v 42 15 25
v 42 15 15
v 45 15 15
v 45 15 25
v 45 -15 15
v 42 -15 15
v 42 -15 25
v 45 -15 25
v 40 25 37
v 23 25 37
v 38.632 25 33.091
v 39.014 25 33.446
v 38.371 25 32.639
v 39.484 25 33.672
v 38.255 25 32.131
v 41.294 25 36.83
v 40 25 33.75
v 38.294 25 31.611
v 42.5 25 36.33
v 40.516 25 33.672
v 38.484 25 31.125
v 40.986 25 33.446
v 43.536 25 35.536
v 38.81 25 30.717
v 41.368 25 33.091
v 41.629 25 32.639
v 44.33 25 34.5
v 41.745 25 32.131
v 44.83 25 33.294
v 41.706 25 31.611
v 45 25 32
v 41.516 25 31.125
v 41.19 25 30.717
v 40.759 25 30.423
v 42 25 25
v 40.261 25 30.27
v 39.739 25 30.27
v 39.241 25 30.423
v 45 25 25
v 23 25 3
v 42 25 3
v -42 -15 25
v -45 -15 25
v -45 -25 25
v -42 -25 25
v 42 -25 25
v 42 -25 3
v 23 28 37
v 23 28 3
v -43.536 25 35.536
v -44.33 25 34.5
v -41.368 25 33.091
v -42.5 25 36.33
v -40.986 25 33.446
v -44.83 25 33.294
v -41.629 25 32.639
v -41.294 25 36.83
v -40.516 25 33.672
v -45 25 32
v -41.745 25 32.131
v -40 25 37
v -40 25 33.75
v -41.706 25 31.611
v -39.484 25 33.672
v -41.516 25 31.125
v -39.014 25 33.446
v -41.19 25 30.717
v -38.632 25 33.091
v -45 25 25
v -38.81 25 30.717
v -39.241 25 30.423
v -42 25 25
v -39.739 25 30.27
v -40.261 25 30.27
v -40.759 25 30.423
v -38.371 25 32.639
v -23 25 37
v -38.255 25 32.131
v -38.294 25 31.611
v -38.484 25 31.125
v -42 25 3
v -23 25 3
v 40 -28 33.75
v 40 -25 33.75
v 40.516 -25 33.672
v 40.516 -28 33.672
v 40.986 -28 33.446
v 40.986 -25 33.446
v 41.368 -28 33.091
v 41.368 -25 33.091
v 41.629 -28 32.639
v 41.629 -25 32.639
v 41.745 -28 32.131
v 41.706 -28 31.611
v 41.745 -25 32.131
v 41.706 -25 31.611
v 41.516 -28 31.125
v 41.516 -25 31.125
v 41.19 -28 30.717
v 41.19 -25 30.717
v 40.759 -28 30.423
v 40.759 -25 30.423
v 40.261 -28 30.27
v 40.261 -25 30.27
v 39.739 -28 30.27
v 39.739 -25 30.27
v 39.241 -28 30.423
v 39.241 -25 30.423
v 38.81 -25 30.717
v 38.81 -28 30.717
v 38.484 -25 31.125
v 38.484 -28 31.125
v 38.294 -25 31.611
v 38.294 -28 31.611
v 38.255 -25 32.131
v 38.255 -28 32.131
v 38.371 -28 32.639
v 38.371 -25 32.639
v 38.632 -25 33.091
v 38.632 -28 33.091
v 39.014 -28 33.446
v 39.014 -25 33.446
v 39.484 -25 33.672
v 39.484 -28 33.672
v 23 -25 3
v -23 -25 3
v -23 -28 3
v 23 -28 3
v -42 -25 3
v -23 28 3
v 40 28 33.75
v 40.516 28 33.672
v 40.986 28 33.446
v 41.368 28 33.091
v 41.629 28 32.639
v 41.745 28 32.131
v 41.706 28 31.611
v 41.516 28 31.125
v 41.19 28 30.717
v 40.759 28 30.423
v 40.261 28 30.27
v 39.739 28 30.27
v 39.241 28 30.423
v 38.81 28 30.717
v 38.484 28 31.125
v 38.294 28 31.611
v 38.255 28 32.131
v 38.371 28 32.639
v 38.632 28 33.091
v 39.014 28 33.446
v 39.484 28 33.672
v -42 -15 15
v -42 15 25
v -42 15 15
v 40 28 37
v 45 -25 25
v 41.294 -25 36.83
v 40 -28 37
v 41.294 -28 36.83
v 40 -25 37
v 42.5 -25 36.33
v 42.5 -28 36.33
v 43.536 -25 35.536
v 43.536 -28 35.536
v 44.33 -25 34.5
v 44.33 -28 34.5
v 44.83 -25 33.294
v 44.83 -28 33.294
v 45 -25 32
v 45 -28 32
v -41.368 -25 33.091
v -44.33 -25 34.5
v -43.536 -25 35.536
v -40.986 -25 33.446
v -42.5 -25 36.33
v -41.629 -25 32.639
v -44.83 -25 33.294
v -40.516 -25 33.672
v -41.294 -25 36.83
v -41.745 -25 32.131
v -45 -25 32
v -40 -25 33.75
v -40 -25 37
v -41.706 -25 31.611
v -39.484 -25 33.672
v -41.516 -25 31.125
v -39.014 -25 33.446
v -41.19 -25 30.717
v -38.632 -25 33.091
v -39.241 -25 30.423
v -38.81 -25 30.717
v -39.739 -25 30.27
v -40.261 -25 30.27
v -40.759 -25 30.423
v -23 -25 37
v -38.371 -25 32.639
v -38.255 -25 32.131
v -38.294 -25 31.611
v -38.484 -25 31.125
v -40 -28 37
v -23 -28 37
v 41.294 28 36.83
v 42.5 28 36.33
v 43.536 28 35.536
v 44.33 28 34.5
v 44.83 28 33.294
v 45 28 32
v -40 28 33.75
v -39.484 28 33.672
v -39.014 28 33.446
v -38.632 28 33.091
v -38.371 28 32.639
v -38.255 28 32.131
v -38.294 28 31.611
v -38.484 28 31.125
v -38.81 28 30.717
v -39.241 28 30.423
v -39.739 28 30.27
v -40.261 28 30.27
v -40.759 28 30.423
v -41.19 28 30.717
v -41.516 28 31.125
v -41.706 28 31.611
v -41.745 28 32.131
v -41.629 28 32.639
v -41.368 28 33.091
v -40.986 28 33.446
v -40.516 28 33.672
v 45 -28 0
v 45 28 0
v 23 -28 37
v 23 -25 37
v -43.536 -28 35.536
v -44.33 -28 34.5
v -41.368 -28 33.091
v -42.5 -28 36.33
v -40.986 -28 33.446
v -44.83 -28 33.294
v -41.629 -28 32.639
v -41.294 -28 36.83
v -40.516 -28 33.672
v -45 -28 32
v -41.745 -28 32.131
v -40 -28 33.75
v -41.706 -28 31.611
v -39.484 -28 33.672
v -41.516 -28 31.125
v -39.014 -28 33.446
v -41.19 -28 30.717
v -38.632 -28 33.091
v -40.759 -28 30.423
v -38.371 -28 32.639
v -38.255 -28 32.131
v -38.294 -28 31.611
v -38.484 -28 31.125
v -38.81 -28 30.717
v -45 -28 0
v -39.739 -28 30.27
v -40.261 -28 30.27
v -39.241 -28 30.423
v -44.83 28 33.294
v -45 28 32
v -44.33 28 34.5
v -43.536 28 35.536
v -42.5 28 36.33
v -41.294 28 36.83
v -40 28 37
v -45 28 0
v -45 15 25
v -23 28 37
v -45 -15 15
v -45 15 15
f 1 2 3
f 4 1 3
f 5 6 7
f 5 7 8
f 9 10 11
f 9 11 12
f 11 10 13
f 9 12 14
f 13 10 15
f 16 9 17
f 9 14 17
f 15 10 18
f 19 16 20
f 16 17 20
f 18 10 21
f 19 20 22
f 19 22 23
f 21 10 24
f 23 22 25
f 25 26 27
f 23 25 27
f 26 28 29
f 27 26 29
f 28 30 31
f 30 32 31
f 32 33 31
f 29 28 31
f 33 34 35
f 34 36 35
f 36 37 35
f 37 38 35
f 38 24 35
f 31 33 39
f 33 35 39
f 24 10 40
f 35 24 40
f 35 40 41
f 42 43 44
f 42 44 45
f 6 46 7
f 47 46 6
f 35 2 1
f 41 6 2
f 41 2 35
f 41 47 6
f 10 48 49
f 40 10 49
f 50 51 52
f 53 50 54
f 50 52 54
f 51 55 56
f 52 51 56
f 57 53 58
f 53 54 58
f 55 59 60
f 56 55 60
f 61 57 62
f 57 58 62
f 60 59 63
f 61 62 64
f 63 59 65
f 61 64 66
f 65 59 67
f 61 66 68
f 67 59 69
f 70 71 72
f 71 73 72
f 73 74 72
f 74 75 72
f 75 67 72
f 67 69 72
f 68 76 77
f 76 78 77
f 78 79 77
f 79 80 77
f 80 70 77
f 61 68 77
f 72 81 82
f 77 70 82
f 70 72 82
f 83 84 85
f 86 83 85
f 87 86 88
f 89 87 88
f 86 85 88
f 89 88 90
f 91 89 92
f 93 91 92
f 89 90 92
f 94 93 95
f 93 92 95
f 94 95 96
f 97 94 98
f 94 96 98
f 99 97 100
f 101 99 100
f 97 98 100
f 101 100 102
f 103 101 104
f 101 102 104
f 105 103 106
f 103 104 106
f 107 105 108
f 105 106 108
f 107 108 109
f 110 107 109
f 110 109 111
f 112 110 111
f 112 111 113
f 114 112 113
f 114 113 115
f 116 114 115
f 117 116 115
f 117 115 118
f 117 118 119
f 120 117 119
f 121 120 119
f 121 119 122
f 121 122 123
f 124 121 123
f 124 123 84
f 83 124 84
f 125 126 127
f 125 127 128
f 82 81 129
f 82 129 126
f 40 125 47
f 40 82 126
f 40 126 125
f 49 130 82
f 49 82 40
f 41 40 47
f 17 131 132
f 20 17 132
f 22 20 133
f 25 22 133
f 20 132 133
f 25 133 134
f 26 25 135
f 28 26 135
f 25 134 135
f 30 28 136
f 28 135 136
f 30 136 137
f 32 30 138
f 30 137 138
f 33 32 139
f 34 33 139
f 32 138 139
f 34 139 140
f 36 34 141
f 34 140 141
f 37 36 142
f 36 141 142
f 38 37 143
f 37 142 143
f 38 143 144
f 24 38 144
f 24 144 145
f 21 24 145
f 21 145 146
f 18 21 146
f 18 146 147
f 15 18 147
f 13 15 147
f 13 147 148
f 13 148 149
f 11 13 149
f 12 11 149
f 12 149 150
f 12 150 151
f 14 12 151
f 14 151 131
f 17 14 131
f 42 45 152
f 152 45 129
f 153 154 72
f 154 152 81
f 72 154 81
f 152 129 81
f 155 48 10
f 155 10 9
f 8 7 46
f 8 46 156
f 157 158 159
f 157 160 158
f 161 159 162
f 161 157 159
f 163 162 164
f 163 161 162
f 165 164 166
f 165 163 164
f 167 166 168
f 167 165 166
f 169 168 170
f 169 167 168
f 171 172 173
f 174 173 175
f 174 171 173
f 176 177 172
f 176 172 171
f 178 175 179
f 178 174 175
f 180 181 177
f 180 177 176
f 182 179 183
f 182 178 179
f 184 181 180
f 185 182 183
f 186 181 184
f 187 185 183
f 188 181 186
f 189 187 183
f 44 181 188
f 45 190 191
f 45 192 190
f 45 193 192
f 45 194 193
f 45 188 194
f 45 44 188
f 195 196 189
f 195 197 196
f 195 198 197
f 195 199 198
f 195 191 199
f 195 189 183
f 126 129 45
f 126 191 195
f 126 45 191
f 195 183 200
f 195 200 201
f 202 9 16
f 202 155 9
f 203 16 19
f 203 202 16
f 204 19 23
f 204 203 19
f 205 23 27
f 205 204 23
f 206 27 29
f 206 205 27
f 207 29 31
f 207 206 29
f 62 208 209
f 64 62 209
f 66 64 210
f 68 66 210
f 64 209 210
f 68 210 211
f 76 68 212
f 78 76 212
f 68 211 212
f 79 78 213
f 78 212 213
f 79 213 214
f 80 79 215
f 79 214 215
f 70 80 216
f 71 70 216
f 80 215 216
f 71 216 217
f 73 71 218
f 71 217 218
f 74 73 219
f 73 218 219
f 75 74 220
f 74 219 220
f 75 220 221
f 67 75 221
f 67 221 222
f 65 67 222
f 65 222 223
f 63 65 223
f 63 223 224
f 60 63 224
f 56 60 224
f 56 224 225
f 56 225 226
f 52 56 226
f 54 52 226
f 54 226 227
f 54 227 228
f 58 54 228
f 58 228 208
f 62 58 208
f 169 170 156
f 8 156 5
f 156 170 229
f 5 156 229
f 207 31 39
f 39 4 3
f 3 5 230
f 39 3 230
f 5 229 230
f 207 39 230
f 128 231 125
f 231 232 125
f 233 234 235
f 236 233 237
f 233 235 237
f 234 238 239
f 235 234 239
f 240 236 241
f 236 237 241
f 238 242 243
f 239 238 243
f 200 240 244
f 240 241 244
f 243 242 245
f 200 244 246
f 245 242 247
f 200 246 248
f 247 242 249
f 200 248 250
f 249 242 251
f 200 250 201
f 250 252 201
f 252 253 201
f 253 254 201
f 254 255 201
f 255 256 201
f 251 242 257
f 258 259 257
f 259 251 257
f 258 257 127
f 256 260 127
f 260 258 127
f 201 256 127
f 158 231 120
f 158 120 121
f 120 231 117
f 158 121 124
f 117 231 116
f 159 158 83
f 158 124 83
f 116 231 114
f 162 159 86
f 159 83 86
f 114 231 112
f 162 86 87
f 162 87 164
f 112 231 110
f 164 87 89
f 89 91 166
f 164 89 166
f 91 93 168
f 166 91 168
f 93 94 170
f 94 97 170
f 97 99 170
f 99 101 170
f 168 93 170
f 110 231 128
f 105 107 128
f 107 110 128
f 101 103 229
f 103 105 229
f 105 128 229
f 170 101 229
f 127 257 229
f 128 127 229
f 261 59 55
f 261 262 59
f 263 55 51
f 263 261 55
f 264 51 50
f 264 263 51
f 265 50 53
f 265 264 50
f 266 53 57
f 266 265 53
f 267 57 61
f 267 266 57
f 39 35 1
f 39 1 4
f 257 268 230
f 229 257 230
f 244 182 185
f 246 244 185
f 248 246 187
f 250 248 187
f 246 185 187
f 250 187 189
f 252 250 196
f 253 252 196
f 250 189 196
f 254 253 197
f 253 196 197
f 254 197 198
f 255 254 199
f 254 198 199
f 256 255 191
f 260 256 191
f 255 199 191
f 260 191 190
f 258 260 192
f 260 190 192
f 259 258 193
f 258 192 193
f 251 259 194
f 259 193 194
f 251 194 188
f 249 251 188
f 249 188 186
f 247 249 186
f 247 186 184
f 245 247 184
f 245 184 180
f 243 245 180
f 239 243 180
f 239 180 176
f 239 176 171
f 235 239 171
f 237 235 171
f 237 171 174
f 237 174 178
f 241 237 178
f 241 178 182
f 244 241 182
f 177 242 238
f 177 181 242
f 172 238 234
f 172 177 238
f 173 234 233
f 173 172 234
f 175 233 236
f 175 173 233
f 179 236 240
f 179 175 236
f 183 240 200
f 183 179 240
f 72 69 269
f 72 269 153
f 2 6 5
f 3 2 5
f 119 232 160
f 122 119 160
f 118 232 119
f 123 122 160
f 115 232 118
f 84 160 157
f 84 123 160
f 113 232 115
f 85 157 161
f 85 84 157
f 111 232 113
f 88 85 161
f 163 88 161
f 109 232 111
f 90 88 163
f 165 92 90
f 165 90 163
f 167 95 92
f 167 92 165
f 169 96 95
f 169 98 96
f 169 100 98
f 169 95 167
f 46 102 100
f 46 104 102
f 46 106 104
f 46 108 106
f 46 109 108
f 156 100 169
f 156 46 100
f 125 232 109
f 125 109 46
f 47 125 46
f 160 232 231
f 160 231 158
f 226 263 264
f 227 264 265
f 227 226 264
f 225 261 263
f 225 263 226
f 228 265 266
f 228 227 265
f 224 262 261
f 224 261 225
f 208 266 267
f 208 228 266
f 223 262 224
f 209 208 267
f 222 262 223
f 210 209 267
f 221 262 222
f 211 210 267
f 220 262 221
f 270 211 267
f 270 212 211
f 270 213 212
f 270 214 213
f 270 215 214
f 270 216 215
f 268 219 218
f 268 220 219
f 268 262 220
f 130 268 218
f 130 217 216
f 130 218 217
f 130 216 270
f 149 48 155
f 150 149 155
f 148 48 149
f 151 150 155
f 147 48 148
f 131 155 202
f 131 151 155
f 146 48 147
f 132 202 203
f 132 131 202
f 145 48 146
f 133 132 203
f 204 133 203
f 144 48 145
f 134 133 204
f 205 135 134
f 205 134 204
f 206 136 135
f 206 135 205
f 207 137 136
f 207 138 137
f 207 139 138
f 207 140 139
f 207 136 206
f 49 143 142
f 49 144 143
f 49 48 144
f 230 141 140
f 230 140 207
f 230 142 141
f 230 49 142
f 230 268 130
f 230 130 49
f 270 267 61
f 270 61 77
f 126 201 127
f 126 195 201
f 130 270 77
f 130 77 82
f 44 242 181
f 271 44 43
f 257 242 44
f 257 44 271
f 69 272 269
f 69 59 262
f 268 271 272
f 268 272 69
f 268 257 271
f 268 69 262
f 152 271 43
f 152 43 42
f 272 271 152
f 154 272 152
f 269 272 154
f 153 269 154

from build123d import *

# Parameters (mm, degrees)
SZKIC1_W                    = 90
SZKIC1_H                    = 56
DODANIE_WYCI_GNI_CIE1_DEPTH = 3
SZKIC2_W                    = 90
SZKIC2_H                    = 3
DODANIE_WYCI_GNI_CIE2_DEPTH = 34
SZKIC4_R                    = 1.75
WYTNIJ_WYCI_GNI_CIE1_DEPTH  = 81.808415403
ZAOKR_GLENIE1_R             = 5
SZKIC5_W                    = 46
SZKIC5_H                    = 40
WYTNIJ_WYCI_GNI_CIE2_DEPTH  = 81.808415403
SZKIC6_W                    = 3
SZKIC6_H                    = 50
DODANIE_WYCI_GNI_CIE4_DEPTH = 12
SZKIC7_W                    = 3
SZKIC7_H                    = 10
DODANIE_WYCI_GNI_CIE5_DEPTH = 10


with BuildPart() as part:
    # Szkic1 → Dodanie-wyciągnięcie1 (new body)
    with BuildSketch(Plane.XY):
        Rectangle(SZKIC1_W, SZKIC1_H)
    extrude(amount=DODANIE_WYCI_GNI_CIE1_DEPTH)

    # Szkic2 → Dodanie-wyciągnięcie2 (add)
    with BuildSketch(Plane.XY.offset(3)):
        with Locations((0, 26.5)):
            Rectangle(SZKIC2_W, SZKIC2_H)
        with Locations((0, -26.5)):
            Rectangle(SZKIC2_W, SZKIC2_H)
    extrude(amount=DODANIE_WYCI_GNI_CIE2_DEPTH)

    # Szkic4 → Wytnij-wyciągnięcie1 (cut, through all)
    with BuildSketch(Plane(origin=(0, 28, 0), x_dir=(1, 0, 0), z_dir=(0, 1, 0))):
        with Locations(Location((-40, -32, 0), (0, 0, 270))):
            Circle(SZKIC4_R)
        with Locations(Location((40, -32, 0), (0, 0, 270))):
            Circle(SZKIC4_R)
    extrude(amount=-WYTNIJ_WYCI_GNI_CIE1_DEPTH, mode=Mode.SUBTRACT)

    # Zaokrąglenie1
    zaokr_glenie1_edges = [part.edges().sort_by_distance(p)[0] for p in [
        (-45, 26.5, 37),
        (45, 26.5, 37),
        (45, -26.5, 37),
        (-45, -26.5, 37),
    ]]
    fillet(zaokr_glenie1_edges, radius=ZAOKR_GLENIE1_R)

    # Szkic5 → Wytnij-wyciągnięcie2 (cut, through all)
    with BuildSketch(Plane(origin=(0, 28, 0), x_dir=(1, 0, 0), z_dir=(0, 1, 0))):
        with Locations((0, -23)):
            Rectangle(SZKIC5_W, SZKIC5_H)
    extrude(amount=-WYTNIJ_WYCI_GNI_CIE2_DEPTH, mode=Mode.SUBTRACT)

    # Szkic6 → Dodanie-wyciągnięcie4 (add)
    with BuildSketch(Plane.XY.offset(3)):
        with Locations((-43.5, 0)):
            Rectangle(SZKIC6_W, SZKIC6_H)
        with Locations((43.5, 0)):
            Rectangle(SZKIC6_W, SZKIC6_H)
    extrude(amount=DODANIE_WYCI_GNI_CIE4_DEPTH)

    # Szkic7 → Dodanie-wyciągnięcie5 (add)
    with BuildSketch(Plane.XY.offset(15)):
        with Locations((-43.5, 20)):
            Rectangle(SZKIC7_W, SZKIC7_H)
        with Locations((-43.5, -20)):
            Rectangle(SZKIC7_W, SZKIC7_H)
        with Locations((43.5, -20)):
            Rectangle(SZKIC7_W, SZKIC7_H)
        with Locations((43.5, 20)):
            Rectangle(SZKIC7_W, SZKIC7_H)
    extrude(amount=DODANIE_WYCI_GNI_CIE5_DEPTH)


solid = part.part
